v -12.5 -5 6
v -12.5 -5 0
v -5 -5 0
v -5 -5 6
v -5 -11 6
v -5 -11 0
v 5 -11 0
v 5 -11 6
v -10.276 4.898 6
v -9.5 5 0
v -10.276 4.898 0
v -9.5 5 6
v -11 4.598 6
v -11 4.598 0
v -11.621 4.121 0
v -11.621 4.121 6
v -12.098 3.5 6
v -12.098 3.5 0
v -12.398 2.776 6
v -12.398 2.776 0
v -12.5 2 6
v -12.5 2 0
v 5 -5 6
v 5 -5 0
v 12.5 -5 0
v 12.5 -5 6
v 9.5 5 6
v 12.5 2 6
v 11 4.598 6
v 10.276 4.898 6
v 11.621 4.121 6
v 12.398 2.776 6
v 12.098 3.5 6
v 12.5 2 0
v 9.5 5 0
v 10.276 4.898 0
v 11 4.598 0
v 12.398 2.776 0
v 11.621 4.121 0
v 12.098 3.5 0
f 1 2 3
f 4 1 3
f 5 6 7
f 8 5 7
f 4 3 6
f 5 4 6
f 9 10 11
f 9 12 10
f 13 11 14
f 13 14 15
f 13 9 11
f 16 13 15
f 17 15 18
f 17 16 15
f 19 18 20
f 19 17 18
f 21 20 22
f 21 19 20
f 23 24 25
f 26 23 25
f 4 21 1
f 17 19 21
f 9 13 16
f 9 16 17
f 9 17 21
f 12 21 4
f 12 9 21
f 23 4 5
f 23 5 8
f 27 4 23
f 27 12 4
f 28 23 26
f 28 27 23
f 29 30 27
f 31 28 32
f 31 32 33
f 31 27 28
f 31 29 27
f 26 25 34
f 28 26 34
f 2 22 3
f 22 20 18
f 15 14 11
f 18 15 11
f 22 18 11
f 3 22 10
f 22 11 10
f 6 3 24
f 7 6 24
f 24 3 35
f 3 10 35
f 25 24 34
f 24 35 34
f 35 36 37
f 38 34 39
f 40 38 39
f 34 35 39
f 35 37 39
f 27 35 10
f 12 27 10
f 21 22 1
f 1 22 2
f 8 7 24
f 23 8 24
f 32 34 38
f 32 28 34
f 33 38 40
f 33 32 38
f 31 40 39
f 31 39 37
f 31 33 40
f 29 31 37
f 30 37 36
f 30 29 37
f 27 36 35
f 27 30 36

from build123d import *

# Parameters (mm, degrees)
BOSS_EXTRU_1_DEPTH = 6
CONG_1_R           = 3


with BuildPart() as part:
    # Esquisse1 → Boss.-Extru.1 (new body)
    with BuildSketch(Plane.XY):
        Polygon((5, -5), (12.5, -5), (12.5, 5), (-12.5, 5), (-12.5, -5), (-5, -5), (-5, -11), (5, -11), align=None)
    extrude(amount=BOSS_EXTRU_1_DEPTH)

    # Congé1
    cong_1_edges = [part.edges().sort_by_distance(p)[0] for p in [
        (-12.5, 5, 3),
        (12.5, 5, 3),
    ]]
    fillet(cong_1_edges, radius=CONG_1_R)


solid = part.part
